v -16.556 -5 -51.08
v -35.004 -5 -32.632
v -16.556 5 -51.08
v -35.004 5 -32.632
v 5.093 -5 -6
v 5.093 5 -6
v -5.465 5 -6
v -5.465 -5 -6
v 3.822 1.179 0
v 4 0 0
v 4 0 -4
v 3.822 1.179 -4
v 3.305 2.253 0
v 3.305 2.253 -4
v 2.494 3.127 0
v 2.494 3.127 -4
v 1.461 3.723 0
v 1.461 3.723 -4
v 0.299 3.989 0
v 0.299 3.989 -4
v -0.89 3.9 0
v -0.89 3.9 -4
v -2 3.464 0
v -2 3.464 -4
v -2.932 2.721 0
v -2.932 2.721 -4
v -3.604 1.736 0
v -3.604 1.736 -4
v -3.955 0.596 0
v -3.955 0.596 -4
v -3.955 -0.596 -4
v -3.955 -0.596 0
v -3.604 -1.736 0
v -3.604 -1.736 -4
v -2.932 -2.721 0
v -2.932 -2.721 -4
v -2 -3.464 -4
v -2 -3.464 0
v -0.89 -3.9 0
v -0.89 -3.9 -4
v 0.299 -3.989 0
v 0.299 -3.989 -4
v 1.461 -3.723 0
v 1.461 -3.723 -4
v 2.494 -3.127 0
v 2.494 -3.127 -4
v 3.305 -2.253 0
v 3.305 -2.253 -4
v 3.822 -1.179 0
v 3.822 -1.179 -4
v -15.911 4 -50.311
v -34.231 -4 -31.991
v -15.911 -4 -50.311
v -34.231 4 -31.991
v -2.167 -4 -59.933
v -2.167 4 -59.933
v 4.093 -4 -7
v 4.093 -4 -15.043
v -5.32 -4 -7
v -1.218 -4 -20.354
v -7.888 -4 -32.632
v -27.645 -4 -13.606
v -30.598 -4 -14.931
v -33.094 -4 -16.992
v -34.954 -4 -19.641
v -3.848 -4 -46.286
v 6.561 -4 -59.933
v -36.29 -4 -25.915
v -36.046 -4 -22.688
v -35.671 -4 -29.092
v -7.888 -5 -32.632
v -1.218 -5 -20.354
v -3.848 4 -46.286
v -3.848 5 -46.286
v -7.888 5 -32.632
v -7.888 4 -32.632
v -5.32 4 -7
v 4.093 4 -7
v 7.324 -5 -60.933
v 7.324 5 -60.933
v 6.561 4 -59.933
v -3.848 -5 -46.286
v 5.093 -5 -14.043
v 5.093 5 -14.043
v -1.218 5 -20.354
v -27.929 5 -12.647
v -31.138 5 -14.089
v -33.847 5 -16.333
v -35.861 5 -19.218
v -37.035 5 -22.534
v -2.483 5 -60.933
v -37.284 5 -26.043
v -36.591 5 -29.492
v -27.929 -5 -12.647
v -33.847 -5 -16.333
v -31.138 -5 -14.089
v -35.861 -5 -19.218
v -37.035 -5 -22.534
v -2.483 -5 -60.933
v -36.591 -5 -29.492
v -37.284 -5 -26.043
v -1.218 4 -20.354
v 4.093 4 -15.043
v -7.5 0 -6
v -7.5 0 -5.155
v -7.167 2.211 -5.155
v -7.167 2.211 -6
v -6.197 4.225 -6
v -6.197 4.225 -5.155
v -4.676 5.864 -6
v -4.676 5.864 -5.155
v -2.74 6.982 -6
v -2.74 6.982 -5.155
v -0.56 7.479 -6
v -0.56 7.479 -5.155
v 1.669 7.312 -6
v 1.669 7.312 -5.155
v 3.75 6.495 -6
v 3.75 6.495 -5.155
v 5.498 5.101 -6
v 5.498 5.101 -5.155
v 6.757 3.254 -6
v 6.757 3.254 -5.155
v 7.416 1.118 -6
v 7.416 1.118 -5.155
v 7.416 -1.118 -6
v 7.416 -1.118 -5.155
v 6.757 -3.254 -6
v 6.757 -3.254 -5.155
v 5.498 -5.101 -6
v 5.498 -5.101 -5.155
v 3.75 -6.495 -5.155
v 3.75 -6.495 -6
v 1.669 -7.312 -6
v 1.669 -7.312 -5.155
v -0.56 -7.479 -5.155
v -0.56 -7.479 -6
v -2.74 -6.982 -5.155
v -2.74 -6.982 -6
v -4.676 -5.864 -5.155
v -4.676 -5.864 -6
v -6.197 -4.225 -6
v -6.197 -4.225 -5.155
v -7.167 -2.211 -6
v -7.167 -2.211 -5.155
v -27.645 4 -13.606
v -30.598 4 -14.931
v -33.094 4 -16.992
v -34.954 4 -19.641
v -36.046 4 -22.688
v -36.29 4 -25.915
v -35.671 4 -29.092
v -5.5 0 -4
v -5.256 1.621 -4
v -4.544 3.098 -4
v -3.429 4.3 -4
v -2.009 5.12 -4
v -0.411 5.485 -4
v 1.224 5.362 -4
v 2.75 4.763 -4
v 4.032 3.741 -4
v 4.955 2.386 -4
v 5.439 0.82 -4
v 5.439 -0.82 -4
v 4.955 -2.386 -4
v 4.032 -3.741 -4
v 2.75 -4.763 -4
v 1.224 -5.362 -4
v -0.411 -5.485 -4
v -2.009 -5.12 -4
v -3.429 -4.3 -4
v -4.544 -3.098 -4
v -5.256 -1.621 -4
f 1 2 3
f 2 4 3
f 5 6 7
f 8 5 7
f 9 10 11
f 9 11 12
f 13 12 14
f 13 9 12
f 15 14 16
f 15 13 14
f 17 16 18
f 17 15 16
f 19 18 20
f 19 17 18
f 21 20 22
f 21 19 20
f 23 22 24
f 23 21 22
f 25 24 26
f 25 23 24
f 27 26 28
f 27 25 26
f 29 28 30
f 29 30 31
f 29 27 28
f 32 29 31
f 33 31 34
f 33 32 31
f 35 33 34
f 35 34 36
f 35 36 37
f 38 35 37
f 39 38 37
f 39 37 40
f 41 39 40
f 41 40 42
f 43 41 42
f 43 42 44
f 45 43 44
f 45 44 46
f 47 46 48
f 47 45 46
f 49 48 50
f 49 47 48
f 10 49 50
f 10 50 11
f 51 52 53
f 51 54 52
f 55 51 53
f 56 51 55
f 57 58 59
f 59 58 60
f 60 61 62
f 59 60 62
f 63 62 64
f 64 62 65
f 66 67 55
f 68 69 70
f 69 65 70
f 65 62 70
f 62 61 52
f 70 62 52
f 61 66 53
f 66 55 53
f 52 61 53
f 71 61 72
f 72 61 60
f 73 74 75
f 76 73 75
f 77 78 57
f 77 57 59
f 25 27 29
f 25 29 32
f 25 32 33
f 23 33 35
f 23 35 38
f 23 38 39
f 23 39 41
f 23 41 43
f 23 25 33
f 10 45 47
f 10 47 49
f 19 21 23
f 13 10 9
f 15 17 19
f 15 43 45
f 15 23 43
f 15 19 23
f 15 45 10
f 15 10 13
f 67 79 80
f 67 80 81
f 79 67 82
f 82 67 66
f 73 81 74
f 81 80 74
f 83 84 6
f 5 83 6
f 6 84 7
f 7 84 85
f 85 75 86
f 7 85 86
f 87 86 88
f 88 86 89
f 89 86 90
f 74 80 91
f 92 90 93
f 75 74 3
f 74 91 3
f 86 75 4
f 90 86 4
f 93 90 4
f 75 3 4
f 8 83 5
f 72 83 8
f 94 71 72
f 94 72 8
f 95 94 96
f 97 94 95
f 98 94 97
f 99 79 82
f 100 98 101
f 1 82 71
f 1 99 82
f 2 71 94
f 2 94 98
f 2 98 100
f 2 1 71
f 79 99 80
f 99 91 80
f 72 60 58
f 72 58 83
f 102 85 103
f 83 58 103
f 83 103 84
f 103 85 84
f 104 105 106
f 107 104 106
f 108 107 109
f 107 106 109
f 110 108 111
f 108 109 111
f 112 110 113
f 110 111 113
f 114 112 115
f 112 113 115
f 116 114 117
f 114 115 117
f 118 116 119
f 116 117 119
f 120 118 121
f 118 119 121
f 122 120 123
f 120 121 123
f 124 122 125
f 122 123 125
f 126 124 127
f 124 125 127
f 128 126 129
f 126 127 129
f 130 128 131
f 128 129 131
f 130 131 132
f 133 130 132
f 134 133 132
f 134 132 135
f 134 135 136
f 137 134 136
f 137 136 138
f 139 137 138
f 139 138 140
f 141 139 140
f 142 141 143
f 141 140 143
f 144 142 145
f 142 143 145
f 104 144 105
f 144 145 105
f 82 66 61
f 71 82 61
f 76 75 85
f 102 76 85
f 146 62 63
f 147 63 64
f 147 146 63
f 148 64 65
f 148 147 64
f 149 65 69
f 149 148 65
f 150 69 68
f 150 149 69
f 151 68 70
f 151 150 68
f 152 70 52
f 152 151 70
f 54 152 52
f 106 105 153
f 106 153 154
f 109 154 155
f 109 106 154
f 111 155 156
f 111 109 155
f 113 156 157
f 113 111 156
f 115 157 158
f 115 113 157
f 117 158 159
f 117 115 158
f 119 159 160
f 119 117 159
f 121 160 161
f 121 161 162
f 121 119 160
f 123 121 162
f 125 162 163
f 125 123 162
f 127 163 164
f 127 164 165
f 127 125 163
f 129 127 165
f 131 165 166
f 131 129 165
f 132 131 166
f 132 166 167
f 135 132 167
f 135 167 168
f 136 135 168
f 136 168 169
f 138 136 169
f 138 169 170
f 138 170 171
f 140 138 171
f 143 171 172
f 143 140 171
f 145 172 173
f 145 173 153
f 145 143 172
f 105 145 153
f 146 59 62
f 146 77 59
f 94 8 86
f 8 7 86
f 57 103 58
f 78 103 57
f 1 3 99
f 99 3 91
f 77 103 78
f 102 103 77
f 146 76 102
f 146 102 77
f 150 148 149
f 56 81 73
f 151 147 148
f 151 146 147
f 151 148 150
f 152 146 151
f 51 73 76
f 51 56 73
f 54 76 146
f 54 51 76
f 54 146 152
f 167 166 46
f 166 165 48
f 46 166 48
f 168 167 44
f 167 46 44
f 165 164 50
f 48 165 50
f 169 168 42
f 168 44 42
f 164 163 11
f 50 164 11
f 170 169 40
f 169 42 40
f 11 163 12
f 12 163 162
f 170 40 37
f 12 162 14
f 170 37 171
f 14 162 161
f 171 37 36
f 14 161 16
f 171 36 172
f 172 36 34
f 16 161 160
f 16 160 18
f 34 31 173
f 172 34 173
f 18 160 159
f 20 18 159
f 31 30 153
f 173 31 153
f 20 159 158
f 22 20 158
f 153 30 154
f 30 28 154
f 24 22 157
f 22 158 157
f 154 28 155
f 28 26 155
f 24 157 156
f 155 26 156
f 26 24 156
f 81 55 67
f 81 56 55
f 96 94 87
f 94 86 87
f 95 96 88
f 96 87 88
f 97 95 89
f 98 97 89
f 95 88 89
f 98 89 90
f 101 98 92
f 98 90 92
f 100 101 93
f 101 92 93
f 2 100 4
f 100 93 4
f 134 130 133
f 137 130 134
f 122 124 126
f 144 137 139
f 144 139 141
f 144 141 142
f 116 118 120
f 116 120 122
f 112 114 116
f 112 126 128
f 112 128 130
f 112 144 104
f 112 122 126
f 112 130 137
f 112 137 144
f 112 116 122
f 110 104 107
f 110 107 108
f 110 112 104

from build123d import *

# Parameters (mm, degrees)
SKETCH1_R           = 4
BOSS_EXTRUDE1_DEPTH = 4
SKETCH2_R           = 7.5
BOSS_EXTRUDE2_DEPTH = 2
CHAMFER1_SIZE       = 2
CHAMFER1_SIZE2      = 1.154700538
BOSS_EXTRUDE3_DEPTH = 5
SHELL3_T            = -1


with BuildPart() as part:
    # Sketch1 → Boss-Extrude1 (new body)
    with BuildSketch(Plane.XY):
        Circle(SKETCH1_R)
    extrude(amount=-BOSS_EXTRUDE1_DEPTH)

    # Sketch2 → Boss-Extrude2 (add)
    with BuildSketch(Plane(origin=(0, 0, -4), x_dir=(-1, 0, 0), z_dir=(0, 0, -1))):
        Circle(SKETCH2_R)
    extrude(amount=BOSS_EXTRUDE2_DEPTH)

    # Chamfer1
    chamfer1_edges = [part.edges().sort_by_distance(p)[0] for p in [
        (7.5, 0, -4),
    ]]
    chamfer1_side = [part.faces().sort_by_distance(p)[0] for p in [
        (7.287867966, 0, -4),
    ]]
    chamfer(chamfer1_edges, length=CHAMFER1_SIZE, length2=CHAMFER1_SIZE2, reference=chamfer1_side[0])


with BuildPart() as body_2:
    # Sketch3 → Boss-Extrude3 (new, symmetric)
    with BuildSketch(Plane(origin=(0, 0, 0), x_dir=(1, 0, 0), z_dir=(0, 1, 0))):
        with BuildLine():
            Line((5.09320586, 6), (-5.465077698, 6))
            Line((-5.465077698, 6), (-27.928776589, 12.647224621))
            ThreePointArc((-27.928776589, 12.647224621), (-36.559963647, 20.836216547), (-35.004066658, 32.631815869))
            Line((-35.004066658, 32.631815869), (-16.556260421, 51.079622106))
            Line((-16.556260421, 51.079622106), (-2.482557919, 60.932976146))
            Line((-2.482557919, 60.932976146), (7.323545861, 60.932976146))
            Line((7.323545861, 60.932976146), (-3.847964774, 46.285884424))
            Line((-3.847964774, 46.285884424), (-7.888335023, 32.631815869))
            Line((-7.888335023, 32.631815869), (-1.217588096, 20.354009814))
            Line((-1.217588096, 20.354009814), (5.09320586, 14.043215857))
            Line((5.09320586, 14.043215857), (5.09320586, 6))
        make_face()
    extrude(amount=BOSS_EXTRUDE3_DEPTH, both=True)

    # Shell3
    shell3_openings = [body_2.faces().sort_by_distance(p)[0] for p in [
        (1.737790543, 0, -53.609430285),
        (-5.868149899, 0, -39.458850146),
        (-4.55296156, 0, -26.492912841),
        (1.937808882, 0, -17.198612835),
    ]]
    offset(amount=SHELL3_T, openings=shell3_openings, kind=Kind.INTERSECTION)


solid = Compound([part.part, body_2.part])
